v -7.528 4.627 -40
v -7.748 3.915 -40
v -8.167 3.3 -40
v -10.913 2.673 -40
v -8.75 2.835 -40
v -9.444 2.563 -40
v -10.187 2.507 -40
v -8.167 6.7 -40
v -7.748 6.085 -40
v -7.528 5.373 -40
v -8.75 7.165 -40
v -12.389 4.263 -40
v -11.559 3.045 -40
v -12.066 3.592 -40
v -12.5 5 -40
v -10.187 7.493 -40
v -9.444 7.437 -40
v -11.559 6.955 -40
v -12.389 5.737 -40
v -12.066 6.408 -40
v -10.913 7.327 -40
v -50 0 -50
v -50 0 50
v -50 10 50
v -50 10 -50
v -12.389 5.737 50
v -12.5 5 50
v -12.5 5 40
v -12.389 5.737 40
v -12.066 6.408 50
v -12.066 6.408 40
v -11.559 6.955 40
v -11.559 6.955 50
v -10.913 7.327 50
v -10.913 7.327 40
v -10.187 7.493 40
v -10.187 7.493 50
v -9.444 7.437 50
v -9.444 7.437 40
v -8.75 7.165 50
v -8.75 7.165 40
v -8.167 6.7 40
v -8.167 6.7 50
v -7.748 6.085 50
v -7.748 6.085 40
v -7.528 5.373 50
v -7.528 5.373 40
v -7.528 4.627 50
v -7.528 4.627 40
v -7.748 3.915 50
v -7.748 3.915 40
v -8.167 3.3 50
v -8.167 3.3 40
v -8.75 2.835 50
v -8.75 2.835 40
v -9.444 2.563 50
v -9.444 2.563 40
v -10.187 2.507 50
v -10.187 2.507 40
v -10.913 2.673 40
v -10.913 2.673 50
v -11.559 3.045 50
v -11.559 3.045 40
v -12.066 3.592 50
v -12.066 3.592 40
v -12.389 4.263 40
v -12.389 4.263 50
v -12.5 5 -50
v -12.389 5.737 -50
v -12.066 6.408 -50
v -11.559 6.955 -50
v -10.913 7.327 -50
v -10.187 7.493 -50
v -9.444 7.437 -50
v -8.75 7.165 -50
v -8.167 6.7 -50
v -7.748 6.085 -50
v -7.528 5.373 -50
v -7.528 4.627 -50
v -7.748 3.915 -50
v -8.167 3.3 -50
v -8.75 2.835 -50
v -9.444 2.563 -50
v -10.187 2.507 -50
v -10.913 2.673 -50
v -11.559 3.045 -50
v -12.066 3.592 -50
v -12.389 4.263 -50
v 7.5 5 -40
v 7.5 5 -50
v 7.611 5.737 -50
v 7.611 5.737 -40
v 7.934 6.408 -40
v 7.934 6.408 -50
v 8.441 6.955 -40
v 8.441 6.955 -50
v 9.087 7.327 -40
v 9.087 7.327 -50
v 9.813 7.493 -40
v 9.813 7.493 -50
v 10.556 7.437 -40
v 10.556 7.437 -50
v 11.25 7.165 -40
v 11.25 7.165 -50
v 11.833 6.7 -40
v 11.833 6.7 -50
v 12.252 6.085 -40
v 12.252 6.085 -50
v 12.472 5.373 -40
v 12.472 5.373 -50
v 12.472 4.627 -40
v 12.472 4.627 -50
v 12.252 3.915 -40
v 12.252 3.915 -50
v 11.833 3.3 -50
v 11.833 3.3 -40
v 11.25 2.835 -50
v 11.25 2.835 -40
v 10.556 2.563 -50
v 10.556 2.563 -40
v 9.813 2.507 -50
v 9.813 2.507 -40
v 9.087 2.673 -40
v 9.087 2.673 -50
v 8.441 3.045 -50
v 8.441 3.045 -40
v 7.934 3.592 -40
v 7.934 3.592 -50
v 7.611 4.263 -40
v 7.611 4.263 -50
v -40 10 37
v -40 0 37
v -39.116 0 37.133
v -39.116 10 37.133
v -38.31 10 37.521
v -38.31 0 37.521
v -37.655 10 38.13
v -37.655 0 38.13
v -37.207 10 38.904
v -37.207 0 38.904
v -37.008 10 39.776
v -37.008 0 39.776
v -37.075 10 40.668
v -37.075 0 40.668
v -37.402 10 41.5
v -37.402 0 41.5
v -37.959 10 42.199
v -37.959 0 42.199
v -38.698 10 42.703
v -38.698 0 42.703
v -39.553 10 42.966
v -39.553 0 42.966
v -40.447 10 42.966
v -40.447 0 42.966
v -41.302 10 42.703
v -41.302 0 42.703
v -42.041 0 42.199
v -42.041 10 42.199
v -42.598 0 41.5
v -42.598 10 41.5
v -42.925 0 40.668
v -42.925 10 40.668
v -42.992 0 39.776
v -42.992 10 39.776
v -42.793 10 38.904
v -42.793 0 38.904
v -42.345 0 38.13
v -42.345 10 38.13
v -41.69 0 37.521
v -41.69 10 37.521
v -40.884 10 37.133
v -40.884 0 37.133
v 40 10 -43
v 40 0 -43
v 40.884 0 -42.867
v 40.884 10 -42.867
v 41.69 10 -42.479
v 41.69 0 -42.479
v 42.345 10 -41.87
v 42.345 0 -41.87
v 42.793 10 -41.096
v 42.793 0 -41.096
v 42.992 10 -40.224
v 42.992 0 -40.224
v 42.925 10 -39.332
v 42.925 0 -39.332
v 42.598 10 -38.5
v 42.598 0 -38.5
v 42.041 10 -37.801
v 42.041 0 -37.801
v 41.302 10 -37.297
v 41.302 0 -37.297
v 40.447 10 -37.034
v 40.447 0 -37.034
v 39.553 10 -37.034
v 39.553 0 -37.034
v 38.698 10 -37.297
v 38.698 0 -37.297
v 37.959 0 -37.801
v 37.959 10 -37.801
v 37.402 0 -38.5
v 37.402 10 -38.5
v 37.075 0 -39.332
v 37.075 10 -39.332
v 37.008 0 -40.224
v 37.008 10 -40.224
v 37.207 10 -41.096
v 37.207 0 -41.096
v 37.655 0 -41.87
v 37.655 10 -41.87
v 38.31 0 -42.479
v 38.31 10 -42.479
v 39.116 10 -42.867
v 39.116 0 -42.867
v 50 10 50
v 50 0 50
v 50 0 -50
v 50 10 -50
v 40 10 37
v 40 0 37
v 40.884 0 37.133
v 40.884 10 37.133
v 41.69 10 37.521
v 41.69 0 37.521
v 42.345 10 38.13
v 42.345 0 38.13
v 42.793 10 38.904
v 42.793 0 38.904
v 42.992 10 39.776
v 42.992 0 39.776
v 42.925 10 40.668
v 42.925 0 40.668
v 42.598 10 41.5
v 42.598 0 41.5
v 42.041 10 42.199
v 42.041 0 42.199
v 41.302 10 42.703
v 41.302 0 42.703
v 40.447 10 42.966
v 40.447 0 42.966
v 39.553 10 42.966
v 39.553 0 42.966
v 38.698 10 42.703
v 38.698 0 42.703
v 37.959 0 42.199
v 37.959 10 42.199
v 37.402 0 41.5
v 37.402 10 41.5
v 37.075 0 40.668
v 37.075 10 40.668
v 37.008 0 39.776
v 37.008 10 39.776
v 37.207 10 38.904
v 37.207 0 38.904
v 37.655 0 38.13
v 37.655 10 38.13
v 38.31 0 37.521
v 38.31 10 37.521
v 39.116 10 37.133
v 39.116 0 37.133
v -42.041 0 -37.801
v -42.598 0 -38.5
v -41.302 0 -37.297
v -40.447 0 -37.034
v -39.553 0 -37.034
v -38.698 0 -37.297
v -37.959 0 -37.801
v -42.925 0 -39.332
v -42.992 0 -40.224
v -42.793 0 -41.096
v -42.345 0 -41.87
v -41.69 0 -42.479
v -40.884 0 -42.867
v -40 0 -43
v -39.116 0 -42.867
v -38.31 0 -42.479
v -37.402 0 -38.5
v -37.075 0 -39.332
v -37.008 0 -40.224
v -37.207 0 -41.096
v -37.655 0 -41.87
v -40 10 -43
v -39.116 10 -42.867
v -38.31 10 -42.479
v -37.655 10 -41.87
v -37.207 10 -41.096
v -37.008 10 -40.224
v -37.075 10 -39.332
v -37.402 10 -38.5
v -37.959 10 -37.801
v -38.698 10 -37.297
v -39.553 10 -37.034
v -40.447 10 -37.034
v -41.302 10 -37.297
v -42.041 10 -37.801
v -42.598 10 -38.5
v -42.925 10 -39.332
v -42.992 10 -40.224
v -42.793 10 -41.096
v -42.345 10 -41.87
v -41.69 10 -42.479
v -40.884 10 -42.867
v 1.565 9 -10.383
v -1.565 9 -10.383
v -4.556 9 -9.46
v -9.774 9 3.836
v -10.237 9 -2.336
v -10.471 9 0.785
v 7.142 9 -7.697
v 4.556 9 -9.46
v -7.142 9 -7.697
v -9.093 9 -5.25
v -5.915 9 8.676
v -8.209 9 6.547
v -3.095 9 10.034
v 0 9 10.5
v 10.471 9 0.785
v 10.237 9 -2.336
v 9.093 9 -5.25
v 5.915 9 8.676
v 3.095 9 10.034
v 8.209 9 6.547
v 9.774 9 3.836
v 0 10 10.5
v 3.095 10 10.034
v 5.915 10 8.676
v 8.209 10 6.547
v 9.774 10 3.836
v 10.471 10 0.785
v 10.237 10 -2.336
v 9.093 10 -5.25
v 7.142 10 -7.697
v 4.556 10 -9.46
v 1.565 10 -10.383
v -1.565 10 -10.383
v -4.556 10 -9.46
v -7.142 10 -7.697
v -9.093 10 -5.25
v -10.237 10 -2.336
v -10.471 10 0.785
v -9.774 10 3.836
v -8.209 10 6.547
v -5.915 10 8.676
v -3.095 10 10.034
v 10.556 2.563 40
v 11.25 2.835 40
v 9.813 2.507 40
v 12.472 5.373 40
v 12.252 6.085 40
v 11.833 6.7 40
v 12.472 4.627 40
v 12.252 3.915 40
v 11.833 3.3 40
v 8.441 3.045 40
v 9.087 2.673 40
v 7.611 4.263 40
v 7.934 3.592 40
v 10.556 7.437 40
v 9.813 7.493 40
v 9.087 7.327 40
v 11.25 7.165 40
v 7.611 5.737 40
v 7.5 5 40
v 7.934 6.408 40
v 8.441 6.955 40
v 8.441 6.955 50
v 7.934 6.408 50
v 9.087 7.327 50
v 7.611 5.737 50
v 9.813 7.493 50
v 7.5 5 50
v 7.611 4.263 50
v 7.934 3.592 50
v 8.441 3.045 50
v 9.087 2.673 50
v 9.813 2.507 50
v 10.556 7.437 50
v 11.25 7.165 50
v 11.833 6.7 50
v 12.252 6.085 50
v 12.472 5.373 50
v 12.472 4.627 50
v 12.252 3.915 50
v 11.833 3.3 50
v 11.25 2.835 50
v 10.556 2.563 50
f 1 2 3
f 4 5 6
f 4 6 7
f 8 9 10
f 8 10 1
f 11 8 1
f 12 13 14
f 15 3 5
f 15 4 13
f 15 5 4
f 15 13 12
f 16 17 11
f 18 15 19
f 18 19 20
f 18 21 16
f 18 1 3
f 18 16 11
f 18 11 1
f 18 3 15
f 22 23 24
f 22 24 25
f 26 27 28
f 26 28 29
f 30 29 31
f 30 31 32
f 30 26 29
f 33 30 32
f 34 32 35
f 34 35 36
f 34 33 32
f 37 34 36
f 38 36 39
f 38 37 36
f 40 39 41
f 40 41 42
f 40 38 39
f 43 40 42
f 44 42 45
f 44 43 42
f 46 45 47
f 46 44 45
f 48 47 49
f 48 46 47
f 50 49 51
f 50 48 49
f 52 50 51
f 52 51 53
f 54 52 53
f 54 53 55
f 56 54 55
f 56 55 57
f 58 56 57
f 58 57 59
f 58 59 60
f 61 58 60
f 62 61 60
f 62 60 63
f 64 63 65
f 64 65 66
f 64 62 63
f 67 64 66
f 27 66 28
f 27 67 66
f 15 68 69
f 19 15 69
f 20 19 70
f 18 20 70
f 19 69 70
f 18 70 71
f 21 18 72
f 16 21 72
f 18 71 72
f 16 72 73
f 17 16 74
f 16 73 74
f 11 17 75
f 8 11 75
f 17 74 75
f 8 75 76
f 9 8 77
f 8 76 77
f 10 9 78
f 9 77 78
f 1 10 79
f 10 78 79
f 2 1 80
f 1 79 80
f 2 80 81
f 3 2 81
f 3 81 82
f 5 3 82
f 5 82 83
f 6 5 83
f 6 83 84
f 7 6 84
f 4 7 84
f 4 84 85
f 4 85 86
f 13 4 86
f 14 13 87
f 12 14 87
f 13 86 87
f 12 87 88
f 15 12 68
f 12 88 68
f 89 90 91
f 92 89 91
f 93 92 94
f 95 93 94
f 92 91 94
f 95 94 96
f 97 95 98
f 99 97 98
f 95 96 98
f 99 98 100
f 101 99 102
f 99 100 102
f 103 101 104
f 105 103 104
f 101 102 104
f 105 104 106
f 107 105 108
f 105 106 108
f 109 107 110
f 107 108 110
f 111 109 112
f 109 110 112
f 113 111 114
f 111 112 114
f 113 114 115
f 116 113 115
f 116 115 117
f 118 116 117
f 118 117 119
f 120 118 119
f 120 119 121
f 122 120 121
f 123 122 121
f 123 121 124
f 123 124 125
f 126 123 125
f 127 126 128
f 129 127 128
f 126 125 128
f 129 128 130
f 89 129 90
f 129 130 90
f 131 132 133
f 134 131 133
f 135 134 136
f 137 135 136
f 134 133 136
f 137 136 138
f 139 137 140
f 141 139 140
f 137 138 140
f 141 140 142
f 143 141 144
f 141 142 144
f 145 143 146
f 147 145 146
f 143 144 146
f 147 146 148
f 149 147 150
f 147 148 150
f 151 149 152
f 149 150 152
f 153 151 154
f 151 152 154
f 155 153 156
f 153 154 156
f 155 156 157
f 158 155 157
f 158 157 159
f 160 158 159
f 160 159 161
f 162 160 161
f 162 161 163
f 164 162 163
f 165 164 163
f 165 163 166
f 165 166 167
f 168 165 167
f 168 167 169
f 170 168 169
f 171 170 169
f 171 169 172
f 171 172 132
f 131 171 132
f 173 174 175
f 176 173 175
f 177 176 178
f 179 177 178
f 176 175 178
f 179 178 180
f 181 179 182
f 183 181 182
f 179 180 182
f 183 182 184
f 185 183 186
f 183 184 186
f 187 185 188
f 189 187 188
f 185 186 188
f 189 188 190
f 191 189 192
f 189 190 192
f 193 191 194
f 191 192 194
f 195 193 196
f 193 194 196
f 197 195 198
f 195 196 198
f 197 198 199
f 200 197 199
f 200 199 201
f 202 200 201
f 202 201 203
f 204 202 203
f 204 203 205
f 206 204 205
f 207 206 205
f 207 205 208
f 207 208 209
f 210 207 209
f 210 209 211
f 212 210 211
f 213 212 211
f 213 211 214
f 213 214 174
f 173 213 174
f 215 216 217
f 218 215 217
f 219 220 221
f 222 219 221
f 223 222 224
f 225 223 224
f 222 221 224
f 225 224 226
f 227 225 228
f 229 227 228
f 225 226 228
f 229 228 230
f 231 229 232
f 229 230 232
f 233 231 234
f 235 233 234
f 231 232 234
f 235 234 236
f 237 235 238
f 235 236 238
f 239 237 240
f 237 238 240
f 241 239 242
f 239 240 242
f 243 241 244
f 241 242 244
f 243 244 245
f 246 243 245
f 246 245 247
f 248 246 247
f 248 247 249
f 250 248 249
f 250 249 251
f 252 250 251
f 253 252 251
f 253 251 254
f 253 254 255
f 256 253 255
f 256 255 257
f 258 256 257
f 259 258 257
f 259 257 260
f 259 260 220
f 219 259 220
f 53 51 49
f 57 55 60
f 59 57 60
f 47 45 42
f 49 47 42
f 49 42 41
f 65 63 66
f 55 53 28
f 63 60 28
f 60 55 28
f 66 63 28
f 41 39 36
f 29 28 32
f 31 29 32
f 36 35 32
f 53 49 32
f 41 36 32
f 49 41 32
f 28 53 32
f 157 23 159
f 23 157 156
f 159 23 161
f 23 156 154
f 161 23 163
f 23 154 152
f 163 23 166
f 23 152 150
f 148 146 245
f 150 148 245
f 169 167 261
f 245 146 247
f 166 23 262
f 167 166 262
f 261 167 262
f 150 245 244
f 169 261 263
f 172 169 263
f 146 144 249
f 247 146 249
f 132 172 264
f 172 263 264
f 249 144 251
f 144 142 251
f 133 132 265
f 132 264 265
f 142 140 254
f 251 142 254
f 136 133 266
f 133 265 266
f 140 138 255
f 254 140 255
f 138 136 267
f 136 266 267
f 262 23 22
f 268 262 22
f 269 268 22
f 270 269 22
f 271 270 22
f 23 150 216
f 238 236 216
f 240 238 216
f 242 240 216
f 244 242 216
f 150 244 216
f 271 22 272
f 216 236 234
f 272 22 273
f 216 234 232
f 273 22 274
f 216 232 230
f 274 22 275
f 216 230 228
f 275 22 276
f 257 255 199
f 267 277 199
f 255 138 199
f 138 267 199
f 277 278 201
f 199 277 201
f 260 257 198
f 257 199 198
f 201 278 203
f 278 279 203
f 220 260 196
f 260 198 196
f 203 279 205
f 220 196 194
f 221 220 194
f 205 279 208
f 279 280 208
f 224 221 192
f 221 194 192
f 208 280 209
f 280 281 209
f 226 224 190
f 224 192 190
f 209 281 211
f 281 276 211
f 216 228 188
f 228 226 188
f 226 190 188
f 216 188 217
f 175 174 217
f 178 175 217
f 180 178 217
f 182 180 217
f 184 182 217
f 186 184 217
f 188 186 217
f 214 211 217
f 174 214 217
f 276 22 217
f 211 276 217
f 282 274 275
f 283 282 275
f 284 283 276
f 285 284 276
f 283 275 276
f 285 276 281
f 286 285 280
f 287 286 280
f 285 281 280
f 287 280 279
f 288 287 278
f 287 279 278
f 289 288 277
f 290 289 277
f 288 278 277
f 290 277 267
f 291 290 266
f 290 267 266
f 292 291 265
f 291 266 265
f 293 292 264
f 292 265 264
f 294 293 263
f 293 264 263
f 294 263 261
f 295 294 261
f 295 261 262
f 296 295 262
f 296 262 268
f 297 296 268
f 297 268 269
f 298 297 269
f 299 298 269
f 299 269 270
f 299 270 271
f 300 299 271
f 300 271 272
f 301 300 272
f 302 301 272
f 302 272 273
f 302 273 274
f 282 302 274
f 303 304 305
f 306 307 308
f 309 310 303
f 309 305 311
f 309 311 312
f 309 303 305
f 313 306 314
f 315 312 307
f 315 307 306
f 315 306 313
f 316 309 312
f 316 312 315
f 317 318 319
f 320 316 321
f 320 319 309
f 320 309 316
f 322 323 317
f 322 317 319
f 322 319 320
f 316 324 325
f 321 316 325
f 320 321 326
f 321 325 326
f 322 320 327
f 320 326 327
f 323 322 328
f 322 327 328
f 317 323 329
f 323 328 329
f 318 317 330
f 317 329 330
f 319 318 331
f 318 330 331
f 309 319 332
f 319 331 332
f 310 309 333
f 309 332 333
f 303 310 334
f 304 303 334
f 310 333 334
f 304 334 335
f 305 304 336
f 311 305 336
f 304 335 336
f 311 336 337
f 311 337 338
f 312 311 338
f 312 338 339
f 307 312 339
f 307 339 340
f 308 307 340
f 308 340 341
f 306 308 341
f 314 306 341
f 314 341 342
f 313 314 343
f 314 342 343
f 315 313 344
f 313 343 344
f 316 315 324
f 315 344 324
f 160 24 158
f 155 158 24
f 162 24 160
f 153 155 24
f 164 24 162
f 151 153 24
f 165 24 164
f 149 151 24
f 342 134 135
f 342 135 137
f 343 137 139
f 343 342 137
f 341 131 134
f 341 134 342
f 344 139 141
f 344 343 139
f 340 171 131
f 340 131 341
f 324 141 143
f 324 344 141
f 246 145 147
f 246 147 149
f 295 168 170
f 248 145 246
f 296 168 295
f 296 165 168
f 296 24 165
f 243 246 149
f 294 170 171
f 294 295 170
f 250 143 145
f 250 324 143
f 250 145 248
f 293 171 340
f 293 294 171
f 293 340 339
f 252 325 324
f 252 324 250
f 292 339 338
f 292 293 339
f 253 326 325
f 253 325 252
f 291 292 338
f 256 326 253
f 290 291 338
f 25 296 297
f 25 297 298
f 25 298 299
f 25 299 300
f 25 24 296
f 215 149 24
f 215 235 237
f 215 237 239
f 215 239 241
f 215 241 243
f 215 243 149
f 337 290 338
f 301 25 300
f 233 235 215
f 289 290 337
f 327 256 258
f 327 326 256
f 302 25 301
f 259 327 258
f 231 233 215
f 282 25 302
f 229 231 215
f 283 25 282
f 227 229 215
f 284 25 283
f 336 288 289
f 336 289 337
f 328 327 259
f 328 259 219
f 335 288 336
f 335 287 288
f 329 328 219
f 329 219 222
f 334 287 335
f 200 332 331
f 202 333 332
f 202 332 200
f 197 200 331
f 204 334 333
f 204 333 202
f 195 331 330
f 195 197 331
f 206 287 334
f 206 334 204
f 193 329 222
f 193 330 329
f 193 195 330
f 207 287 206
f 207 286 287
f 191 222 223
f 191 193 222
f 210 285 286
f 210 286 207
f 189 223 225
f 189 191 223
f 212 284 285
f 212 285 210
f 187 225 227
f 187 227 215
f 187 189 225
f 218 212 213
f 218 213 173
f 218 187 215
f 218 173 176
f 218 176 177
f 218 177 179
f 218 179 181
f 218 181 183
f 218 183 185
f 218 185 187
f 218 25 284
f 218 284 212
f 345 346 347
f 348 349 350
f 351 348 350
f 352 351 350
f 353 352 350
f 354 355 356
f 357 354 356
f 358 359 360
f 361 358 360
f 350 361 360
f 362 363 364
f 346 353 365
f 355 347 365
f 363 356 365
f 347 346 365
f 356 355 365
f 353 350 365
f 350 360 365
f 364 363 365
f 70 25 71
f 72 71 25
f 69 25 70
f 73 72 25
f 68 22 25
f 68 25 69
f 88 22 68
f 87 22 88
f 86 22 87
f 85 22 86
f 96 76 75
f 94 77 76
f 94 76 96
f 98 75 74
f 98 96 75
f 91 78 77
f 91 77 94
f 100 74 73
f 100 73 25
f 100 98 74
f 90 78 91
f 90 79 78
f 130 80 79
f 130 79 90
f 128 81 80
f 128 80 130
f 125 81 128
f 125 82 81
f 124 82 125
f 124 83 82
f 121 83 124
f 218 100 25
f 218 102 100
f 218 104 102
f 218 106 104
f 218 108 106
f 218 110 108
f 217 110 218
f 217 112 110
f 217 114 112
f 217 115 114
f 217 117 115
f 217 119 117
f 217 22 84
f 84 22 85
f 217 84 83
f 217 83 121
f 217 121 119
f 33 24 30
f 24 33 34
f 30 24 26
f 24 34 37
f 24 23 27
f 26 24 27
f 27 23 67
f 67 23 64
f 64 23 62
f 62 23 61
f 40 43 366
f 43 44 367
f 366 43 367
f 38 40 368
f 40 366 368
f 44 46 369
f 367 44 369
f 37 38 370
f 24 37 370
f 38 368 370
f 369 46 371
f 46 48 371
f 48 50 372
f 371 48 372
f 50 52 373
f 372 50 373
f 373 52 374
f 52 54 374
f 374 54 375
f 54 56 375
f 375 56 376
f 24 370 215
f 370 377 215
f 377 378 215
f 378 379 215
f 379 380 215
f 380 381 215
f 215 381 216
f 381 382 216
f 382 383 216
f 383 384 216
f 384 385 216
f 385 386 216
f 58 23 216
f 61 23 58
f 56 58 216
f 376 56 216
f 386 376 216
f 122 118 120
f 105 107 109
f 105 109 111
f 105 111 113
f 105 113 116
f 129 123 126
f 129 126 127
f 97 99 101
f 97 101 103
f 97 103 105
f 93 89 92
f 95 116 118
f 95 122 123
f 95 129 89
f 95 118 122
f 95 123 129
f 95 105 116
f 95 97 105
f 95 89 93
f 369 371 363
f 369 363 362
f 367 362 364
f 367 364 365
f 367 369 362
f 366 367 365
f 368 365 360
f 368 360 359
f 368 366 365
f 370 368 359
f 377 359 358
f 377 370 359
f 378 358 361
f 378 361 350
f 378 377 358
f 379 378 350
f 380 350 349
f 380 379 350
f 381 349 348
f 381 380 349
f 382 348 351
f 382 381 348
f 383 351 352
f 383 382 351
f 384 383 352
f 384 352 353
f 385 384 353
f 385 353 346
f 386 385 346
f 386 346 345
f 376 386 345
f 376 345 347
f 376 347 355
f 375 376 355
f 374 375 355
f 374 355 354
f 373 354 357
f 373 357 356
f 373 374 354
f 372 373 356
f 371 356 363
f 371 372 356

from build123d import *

# Parameters (mm, degrees)
SKETCH1_W           = 100
SKETCH1_H           = 100
BASE_DEPTH          = 10
SKETCH2_R           = 10.5
LOAD_CELL_CUT_DEPTH = 1
CUT_EXTRUDE1_REACH  = 73.414
SKETCH15_R          = 3
SKETCH21_R          = 2.5
CUT_EXTRUDE2_DEPTH  = 10


with BuildPart() as part:
    # Sketch1 → base (new body)
    with BuildSketch(Plane(origin=(0, 0, 0), x_dir=(1, 0, 0), z_dir=(0, 1, 0))):
        Rectangle(SKETCH1_W, SKETCH1_H)
    extrude(amount=BASE_DEPTH)

    # Sketch2 → load cell cut (cut)
    with BuildSketch(Plane(origin=(0, 10, 0), x_dir=(1, 0, 0), z_dir=(0, 1, 0))):
        with Locations(Location((0, 0, 0), (0, 0, 270))):
            Circle(SKETCH2_R)
    extrude(amount=-LOAD_CELL_CUT_DEPTH, mode=Mode.SUBTRACT)

    # Sketch15 → Cut-Extrude1 (cut, up to next)
    with BuildSketch(Plane(origin=(0, 0, 0), x_dir=(-1, 0, 0), z_dir=(0, -1, 0)), mode=Mode.PRIVATE) as cut_extrude1_sk1:
        with Locations(Location((40, -40, 0), (0, 0, 90))):
            Circle(SKETCH15_R)
    cut_extrude1_tool1 = extrude(cut_extrude1_sk1.sketch, amount=-CUT_EXTRUDE1_REACH, mode=Mode.PRIVATE) & part.part
    # Sketch15 → Cut-Extrude1 (cut, up to next)
    with BuildSketch(Plane(origin=(0, 0, 0), x_dir=(-1, 0, 0), z_dir=(0, -1, 0)), mode=Mode.PRIVATE) as cut_extrude1_sk2:
        with Locations(Location((-40, -40, 0), (0, 0, 90))):
            Circle(SKETCH15_R)
    cut_extrude1_tool2 = extrude(cut_extrude1_sk2.sketch, amount=-CUT_EXTRUDE1_REACH, mode=Mode.PRIVATE) & part.part
    # Sketch15 → Cut-Extrude1 (cut, up to next)
    with BuildSketch(Plane(origin=(0, 0, 0), x_dir=(-1, 0, 0), z_dir=(0, -1, 0)), mode=Mode.PRIVATE) as cut_extrude1_sk3:
        with Locations(Location((40, 40, 0), (0, 0, 90))):
            Circle(SKETCH15_R)
    cut_extrude1_tool3 = extrude(cut_extrude1_sk3.sketch, amount=-CUT_EXTRUDE1_REACH, mode=Mode.PRIVATE) & part.part
    # Sketch15 → Cut-Extrude1 (cut, up to next)
    with BuildSketch(Plane(origin=(0, 0, 0), x_dir=(-1, 0, 0), z_dir=(0, -1, 0)), mode=Mode.PRIVATE) as cut_extrude1_sk4:
        with Locations(Location((-40, 40, 0), (0, 0, 90))):
            Circle(SKETCH15_R)
    cut_extrude1_tool4 = extrude(cut_extrude1_sk4.sketch, amount=-CUT_EXTRUDE1_REACH, mode=Mode.PRIVATE) & part.part
    add(cut_extrude1_tool1.solids().sort_by_distance((-40, 0, 40))[0], mode=Mode.SUBTRACT)
    add(cut_extrude1_tool2.solids().sort_by_distance((40, 0, 40))[0], mode=Mode.SUBTRACT)
    add(cut_extrude1_tool3.solids().sort_by_distance((-40, 0, -40))[0], mode=Mode.SUBTRACT)
    add(cut_extrude1_tool4.solids().sort_by_distance((40, 0, -40))[0], mode=Mode.SUBTRACT)

    # Sketch21 → Cut-Extrude2 (cut)
    with BuildSketch(Plane(origin=(0, 0, -50), x_dir=(-1, 0, 0), z_dir=(0, 0, -1))):
        with Locations((-10, 5)):
            Circle(SKETCH21_R)
        with Locations((10, 5)):
            Circle(SKETCH21_R)
    cut_extrude2 = extrude(amount=-CUT_EXTRUDE2_DEPTH, mode=Mode.SUBTRACT)

    # Mirror2: Cut-Extrude2 across plane
    add(cut_extrude2.mirror(Plane.XY), mode=Mode.SUBTRACT)


solid = part.part
